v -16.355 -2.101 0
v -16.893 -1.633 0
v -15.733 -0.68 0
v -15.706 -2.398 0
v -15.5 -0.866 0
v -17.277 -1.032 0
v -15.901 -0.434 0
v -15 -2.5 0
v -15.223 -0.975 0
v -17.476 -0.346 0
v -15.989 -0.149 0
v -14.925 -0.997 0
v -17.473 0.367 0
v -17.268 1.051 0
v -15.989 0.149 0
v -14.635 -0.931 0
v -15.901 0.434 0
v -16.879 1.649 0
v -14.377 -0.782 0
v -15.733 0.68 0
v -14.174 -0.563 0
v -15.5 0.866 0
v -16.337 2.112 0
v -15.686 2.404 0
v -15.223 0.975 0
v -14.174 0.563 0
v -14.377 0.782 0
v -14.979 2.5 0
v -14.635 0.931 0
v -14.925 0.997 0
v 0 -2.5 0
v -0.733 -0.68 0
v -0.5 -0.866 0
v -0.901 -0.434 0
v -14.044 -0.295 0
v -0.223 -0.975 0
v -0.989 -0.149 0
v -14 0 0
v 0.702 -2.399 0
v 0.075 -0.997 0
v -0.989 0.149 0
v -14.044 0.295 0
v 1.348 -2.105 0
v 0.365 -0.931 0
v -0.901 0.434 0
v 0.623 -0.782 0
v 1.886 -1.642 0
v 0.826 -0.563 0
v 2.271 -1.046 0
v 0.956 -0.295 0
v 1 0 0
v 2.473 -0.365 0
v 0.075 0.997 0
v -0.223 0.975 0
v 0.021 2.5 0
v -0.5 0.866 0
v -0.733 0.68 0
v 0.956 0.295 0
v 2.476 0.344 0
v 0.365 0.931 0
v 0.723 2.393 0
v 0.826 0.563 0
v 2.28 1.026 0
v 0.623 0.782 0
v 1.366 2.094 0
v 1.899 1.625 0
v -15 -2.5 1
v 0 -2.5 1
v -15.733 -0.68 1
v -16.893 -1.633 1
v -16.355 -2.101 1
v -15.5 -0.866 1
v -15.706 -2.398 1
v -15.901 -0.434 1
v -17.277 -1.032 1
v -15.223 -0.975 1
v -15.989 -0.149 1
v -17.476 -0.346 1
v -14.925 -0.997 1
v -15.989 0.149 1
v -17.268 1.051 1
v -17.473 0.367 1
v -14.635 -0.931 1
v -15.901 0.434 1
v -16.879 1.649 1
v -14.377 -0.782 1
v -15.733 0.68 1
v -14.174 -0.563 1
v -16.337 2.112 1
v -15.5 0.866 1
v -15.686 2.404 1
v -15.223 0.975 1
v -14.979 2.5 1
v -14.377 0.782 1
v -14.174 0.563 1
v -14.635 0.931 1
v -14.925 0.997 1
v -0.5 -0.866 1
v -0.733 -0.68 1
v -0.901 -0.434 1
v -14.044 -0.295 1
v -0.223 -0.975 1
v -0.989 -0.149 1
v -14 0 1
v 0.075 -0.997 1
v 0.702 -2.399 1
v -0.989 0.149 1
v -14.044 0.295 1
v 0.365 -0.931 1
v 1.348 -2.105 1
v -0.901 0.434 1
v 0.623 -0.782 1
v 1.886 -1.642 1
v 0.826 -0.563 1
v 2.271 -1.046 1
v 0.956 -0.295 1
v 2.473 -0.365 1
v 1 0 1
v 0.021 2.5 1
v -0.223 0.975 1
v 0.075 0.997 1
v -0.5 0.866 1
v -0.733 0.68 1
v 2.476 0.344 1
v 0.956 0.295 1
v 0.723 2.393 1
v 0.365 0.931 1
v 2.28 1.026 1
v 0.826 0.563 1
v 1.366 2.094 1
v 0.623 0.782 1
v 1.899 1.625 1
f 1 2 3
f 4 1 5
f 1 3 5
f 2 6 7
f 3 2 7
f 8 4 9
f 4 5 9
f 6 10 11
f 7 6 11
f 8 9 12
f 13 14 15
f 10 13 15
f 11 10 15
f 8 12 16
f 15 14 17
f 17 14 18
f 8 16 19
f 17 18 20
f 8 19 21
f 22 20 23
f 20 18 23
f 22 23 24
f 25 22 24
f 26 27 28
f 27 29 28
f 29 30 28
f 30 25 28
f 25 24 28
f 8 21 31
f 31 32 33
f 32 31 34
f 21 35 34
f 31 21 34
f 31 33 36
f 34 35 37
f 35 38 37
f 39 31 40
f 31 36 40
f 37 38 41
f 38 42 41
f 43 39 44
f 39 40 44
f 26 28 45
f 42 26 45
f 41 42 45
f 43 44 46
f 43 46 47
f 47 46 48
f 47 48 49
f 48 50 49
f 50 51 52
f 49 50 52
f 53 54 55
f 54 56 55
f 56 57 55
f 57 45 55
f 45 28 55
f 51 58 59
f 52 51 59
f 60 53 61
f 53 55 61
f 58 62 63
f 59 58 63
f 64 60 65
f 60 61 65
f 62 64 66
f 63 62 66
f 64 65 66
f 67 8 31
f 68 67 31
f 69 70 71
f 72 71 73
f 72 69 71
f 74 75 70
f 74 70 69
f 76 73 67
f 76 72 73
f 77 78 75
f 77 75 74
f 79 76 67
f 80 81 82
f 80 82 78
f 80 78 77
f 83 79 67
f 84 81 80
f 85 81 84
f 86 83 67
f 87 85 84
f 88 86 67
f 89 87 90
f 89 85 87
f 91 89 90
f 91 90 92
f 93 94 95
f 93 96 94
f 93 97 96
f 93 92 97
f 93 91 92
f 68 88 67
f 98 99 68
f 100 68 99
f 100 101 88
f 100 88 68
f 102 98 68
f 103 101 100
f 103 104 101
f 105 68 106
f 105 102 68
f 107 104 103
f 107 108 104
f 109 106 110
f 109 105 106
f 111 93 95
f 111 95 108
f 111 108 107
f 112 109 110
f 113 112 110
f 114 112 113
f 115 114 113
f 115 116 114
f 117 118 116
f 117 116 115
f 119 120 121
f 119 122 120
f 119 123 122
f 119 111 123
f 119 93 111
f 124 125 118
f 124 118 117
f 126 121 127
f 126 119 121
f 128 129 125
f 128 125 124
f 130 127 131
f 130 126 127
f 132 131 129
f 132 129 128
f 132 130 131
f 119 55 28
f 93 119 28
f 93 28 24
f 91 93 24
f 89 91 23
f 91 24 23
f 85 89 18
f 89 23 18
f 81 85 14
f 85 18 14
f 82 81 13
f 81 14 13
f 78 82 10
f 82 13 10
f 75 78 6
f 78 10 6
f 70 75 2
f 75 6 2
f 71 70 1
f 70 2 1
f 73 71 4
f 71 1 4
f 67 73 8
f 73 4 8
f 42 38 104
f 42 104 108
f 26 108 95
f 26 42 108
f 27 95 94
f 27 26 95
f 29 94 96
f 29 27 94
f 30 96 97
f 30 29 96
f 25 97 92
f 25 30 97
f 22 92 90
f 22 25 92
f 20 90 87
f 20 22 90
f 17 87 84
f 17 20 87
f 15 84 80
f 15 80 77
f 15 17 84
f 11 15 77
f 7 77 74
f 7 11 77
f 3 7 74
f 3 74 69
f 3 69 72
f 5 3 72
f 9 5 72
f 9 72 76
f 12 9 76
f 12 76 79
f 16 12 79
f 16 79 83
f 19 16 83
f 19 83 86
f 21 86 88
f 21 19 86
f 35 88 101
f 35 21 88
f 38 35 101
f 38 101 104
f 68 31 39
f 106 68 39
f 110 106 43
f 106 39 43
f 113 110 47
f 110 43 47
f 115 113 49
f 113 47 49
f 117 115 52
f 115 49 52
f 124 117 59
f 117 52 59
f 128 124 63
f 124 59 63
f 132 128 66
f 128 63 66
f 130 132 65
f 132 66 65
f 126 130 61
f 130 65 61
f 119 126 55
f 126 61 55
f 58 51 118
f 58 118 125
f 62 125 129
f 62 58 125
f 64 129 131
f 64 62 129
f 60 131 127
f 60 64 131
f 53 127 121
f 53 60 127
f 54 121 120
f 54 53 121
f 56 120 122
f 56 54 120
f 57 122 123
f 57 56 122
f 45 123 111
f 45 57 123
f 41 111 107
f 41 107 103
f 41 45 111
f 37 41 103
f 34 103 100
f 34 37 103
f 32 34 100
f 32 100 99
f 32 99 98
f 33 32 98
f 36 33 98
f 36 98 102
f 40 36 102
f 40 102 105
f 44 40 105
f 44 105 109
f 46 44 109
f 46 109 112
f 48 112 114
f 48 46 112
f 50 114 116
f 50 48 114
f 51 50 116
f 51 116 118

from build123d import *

# Parameters (mm, degrees)
SKETCH1_R           = 1
BOSS_EXTRUDE1_DEPTH = 1


with BuildPart() as part:
    # Sketch1 → Boss-Extrude1 (new body)
    with BuildSketch(Plane.XY):
        with BuildLine():
            Line((-0.021163243, 2.499910422), (-14.978836757, 2.499910422))
            ThreePointArc((-14.978836757, 2.499910422), (-17.499977605, 0.010581716), (-15, -2.5))
            Line((-15, -2.5), (0, -2.5))
            ThreePointArc((0, -2.5), (2.499977605, -0.010581716), (0.021163243, 2.499910422))
            Line((0.021163243, 2.499910422), (-0.021163243, 2.499910422))
        make_face()
        with Locations((-15, 0)):
            Circle(SKETCH1_R, mode=Mode.SUBTRACT)
        Circle(SKETCH1_R, mode=Mode.SUBTRACT)
    extrude(amount=BOSS_EXTRUDE1_DEPTH)


solid = part.part
